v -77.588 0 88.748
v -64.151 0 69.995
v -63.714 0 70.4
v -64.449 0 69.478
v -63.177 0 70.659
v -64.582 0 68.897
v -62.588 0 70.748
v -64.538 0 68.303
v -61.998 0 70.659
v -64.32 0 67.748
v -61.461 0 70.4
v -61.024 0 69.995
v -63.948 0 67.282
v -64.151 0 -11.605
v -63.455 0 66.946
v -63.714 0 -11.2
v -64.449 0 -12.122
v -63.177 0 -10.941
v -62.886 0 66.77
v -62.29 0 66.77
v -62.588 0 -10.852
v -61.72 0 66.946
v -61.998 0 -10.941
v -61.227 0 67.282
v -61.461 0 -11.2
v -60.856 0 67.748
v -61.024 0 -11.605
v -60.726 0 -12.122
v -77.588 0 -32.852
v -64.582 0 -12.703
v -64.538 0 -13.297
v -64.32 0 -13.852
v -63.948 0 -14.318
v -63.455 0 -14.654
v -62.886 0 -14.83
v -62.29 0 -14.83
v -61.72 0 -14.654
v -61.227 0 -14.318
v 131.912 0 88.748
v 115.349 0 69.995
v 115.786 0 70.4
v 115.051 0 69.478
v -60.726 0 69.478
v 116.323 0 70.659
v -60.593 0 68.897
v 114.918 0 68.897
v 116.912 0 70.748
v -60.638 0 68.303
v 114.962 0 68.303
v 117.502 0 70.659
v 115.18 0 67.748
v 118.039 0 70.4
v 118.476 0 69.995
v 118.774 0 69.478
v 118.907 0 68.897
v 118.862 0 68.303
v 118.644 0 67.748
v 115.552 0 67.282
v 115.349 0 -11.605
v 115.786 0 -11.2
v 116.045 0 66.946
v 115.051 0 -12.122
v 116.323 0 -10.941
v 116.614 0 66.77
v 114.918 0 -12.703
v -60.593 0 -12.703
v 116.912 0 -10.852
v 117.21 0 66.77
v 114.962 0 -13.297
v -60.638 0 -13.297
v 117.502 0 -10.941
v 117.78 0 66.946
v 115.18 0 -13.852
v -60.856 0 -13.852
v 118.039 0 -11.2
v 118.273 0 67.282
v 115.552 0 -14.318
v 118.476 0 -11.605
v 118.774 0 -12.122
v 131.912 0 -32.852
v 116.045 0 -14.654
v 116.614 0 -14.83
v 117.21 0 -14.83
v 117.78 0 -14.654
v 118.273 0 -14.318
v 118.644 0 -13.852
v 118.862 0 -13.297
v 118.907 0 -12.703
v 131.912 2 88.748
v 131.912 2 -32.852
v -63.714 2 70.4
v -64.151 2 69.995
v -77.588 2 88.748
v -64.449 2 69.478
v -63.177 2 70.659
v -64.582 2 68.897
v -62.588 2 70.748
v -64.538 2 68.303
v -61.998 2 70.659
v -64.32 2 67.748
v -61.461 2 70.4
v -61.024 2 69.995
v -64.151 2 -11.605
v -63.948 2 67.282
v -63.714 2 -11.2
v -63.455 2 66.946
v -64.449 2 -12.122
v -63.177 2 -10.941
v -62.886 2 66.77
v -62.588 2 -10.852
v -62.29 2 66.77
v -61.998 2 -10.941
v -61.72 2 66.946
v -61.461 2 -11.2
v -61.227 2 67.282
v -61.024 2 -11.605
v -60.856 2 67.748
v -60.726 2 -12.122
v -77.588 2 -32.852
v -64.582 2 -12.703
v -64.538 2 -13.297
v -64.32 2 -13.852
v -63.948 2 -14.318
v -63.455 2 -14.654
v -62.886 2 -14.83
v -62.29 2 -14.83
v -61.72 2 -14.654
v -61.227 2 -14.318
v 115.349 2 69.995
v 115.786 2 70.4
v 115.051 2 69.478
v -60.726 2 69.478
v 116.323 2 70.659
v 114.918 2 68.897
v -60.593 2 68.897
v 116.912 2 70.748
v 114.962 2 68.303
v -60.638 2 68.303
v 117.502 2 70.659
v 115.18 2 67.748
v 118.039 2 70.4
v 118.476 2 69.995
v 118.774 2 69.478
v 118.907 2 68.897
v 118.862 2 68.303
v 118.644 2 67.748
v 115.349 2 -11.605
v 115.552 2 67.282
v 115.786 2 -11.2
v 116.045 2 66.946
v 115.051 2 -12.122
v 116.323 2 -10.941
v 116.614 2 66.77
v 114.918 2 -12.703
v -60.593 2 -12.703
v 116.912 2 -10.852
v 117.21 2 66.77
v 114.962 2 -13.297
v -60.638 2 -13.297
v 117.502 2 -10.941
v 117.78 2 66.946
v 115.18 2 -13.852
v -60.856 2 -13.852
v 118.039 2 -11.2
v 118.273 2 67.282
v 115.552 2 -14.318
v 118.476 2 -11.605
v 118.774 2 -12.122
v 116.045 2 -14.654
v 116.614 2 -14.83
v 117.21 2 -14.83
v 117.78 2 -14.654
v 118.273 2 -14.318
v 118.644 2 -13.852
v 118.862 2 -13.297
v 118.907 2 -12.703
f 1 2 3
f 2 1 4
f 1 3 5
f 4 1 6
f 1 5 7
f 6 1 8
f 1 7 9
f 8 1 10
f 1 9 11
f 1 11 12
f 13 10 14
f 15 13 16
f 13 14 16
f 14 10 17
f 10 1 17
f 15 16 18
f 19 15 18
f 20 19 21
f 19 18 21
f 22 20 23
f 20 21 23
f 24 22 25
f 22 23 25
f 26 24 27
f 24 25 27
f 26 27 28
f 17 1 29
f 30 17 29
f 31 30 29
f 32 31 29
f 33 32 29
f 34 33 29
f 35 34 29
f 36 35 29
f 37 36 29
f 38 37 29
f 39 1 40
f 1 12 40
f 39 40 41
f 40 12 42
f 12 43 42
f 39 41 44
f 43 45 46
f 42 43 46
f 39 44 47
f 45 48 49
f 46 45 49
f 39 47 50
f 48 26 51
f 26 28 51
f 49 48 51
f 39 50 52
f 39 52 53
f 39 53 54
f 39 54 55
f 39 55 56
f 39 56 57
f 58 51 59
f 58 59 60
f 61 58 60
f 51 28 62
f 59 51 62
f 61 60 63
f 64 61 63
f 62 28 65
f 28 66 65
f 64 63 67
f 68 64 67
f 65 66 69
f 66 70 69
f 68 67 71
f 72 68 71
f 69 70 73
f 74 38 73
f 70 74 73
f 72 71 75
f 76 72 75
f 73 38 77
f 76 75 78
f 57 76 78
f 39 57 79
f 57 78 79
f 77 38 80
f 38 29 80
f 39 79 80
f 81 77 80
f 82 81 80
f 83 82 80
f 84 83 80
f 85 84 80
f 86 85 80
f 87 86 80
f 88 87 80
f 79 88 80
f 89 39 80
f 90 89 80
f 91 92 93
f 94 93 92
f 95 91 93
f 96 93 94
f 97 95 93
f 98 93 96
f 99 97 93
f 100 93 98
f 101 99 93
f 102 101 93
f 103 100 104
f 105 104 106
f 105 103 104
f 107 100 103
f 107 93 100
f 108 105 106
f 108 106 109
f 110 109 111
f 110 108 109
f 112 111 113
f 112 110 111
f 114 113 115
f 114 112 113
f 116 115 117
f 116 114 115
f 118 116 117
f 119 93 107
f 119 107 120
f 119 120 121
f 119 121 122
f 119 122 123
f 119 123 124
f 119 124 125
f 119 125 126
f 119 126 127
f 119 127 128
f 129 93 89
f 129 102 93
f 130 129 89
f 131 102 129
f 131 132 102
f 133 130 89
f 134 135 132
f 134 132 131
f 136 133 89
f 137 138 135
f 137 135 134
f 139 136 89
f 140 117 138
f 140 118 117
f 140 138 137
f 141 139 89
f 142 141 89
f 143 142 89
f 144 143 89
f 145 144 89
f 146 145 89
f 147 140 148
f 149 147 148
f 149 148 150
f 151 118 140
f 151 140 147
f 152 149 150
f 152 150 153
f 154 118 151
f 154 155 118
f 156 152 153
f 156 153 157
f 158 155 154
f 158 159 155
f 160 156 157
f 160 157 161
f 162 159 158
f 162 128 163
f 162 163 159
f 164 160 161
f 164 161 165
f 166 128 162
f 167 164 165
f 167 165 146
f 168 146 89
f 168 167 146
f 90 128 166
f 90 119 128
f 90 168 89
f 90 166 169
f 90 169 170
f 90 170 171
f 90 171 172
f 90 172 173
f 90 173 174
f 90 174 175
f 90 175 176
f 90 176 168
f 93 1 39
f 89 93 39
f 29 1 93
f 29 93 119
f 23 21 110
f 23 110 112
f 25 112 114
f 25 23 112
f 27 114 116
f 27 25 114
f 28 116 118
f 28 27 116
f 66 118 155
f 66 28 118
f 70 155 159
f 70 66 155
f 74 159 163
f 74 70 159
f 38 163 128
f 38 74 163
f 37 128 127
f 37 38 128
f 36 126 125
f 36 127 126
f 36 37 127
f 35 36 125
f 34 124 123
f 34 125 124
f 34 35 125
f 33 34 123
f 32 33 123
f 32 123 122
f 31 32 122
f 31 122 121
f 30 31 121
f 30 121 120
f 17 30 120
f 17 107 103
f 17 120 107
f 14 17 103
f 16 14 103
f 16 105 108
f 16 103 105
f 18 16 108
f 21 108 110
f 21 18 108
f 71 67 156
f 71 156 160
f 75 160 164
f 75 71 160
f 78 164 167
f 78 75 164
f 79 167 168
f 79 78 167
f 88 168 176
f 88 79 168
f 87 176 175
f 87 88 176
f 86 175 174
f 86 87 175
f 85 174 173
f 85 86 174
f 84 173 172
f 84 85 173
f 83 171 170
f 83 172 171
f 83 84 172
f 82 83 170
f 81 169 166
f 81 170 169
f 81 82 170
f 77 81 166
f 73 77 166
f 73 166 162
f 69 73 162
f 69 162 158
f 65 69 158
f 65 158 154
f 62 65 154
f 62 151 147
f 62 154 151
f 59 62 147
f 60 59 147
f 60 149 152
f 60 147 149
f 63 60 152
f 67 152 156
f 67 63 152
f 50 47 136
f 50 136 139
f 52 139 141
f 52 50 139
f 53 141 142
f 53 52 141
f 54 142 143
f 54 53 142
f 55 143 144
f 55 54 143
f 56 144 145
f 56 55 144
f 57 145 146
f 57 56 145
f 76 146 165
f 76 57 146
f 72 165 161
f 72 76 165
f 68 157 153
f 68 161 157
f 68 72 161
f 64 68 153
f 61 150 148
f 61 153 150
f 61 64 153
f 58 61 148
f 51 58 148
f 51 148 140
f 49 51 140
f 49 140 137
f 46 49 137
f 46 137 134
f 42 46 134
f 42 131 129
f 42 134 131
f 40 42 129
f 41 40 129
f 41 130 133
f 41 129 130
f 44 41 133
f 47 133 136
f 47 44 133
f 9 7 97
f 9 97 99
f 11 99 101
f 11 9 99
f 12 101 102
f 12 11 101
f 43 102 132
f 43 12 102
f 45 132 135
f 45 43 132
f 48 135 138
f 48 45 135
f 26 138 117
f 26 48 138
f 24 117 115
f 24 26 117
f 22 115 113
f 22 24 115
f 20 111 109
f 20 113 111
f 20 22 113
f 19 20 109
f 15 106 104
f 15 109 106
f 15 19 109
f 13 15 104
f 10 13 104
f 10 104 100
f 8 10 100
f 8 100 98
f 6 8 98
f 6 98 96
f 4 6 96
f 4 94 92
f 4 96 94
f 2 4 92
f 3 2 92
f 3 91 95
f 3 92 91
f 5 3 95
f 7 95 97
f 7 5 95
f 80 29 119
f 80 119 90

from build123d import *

# Parameters (mm, degrees)
SKETCH1_W               = 209.5
SKETCH1_H               = 121.6
BOSS_EXTRUDE1_DEPTH     = 2
CUT_EXTRUDE1_DEPTH      = 160.000086316
CUT_EXTRUDE1_DEPTH_BACK = 160.000086316
SKETCH2_R               = 2


with BuildPart() as part:
    # Sketch1 → Boss-Extrude1 (new body)
    with BuildSketch(Plane(origin=(0, 0, 0), x_dir=(1, 0, 0), z_dir=(0, 1, 0))):
        with Locations((27.162313362, -27.947783251)):
            Rectangle(SKETCH1_W, SKETCH1_H)
    extrude(amount=BOSS_EXTRUDE1_DEPTH)

    # Sketch2 → Cut-Extrude1 (cut, two sides: drawn at the far end of the back side and taken through both)
    with BuildSketch(Plane(origin=(0, 2, 0), x_dir=(1, 0, 0), z_dir=(0, 1, 0)).offset(-CUT_EXTRUDE1_DEPTH_BACK)):
        with Locations(Location((-62.587686638, 12.852216749, 0), (0, 0, 270))):
            Circle(SKETCH2_R)
        with Locations(Location((116.912313362, 12.852216749, 0), (0, 0, 270))):
            Circle(SKETCH2_R)
        with Locations(Location((-62.587686638, -68.747783251, 0), (0, 0, 270))):
            Circle(SKETCH2_R)
        with Locations(Location((116.912313362, -68.747783251, 0), (0, 0, 270))):
            Circle(SKETCH2_R)
    extrude(amount=CUT_EXTRUDE1_DEPTH + CUT_EXTRUDE1_DEPTH_BACK, mode=Mode.SUBTRACT)


solid = part.part
